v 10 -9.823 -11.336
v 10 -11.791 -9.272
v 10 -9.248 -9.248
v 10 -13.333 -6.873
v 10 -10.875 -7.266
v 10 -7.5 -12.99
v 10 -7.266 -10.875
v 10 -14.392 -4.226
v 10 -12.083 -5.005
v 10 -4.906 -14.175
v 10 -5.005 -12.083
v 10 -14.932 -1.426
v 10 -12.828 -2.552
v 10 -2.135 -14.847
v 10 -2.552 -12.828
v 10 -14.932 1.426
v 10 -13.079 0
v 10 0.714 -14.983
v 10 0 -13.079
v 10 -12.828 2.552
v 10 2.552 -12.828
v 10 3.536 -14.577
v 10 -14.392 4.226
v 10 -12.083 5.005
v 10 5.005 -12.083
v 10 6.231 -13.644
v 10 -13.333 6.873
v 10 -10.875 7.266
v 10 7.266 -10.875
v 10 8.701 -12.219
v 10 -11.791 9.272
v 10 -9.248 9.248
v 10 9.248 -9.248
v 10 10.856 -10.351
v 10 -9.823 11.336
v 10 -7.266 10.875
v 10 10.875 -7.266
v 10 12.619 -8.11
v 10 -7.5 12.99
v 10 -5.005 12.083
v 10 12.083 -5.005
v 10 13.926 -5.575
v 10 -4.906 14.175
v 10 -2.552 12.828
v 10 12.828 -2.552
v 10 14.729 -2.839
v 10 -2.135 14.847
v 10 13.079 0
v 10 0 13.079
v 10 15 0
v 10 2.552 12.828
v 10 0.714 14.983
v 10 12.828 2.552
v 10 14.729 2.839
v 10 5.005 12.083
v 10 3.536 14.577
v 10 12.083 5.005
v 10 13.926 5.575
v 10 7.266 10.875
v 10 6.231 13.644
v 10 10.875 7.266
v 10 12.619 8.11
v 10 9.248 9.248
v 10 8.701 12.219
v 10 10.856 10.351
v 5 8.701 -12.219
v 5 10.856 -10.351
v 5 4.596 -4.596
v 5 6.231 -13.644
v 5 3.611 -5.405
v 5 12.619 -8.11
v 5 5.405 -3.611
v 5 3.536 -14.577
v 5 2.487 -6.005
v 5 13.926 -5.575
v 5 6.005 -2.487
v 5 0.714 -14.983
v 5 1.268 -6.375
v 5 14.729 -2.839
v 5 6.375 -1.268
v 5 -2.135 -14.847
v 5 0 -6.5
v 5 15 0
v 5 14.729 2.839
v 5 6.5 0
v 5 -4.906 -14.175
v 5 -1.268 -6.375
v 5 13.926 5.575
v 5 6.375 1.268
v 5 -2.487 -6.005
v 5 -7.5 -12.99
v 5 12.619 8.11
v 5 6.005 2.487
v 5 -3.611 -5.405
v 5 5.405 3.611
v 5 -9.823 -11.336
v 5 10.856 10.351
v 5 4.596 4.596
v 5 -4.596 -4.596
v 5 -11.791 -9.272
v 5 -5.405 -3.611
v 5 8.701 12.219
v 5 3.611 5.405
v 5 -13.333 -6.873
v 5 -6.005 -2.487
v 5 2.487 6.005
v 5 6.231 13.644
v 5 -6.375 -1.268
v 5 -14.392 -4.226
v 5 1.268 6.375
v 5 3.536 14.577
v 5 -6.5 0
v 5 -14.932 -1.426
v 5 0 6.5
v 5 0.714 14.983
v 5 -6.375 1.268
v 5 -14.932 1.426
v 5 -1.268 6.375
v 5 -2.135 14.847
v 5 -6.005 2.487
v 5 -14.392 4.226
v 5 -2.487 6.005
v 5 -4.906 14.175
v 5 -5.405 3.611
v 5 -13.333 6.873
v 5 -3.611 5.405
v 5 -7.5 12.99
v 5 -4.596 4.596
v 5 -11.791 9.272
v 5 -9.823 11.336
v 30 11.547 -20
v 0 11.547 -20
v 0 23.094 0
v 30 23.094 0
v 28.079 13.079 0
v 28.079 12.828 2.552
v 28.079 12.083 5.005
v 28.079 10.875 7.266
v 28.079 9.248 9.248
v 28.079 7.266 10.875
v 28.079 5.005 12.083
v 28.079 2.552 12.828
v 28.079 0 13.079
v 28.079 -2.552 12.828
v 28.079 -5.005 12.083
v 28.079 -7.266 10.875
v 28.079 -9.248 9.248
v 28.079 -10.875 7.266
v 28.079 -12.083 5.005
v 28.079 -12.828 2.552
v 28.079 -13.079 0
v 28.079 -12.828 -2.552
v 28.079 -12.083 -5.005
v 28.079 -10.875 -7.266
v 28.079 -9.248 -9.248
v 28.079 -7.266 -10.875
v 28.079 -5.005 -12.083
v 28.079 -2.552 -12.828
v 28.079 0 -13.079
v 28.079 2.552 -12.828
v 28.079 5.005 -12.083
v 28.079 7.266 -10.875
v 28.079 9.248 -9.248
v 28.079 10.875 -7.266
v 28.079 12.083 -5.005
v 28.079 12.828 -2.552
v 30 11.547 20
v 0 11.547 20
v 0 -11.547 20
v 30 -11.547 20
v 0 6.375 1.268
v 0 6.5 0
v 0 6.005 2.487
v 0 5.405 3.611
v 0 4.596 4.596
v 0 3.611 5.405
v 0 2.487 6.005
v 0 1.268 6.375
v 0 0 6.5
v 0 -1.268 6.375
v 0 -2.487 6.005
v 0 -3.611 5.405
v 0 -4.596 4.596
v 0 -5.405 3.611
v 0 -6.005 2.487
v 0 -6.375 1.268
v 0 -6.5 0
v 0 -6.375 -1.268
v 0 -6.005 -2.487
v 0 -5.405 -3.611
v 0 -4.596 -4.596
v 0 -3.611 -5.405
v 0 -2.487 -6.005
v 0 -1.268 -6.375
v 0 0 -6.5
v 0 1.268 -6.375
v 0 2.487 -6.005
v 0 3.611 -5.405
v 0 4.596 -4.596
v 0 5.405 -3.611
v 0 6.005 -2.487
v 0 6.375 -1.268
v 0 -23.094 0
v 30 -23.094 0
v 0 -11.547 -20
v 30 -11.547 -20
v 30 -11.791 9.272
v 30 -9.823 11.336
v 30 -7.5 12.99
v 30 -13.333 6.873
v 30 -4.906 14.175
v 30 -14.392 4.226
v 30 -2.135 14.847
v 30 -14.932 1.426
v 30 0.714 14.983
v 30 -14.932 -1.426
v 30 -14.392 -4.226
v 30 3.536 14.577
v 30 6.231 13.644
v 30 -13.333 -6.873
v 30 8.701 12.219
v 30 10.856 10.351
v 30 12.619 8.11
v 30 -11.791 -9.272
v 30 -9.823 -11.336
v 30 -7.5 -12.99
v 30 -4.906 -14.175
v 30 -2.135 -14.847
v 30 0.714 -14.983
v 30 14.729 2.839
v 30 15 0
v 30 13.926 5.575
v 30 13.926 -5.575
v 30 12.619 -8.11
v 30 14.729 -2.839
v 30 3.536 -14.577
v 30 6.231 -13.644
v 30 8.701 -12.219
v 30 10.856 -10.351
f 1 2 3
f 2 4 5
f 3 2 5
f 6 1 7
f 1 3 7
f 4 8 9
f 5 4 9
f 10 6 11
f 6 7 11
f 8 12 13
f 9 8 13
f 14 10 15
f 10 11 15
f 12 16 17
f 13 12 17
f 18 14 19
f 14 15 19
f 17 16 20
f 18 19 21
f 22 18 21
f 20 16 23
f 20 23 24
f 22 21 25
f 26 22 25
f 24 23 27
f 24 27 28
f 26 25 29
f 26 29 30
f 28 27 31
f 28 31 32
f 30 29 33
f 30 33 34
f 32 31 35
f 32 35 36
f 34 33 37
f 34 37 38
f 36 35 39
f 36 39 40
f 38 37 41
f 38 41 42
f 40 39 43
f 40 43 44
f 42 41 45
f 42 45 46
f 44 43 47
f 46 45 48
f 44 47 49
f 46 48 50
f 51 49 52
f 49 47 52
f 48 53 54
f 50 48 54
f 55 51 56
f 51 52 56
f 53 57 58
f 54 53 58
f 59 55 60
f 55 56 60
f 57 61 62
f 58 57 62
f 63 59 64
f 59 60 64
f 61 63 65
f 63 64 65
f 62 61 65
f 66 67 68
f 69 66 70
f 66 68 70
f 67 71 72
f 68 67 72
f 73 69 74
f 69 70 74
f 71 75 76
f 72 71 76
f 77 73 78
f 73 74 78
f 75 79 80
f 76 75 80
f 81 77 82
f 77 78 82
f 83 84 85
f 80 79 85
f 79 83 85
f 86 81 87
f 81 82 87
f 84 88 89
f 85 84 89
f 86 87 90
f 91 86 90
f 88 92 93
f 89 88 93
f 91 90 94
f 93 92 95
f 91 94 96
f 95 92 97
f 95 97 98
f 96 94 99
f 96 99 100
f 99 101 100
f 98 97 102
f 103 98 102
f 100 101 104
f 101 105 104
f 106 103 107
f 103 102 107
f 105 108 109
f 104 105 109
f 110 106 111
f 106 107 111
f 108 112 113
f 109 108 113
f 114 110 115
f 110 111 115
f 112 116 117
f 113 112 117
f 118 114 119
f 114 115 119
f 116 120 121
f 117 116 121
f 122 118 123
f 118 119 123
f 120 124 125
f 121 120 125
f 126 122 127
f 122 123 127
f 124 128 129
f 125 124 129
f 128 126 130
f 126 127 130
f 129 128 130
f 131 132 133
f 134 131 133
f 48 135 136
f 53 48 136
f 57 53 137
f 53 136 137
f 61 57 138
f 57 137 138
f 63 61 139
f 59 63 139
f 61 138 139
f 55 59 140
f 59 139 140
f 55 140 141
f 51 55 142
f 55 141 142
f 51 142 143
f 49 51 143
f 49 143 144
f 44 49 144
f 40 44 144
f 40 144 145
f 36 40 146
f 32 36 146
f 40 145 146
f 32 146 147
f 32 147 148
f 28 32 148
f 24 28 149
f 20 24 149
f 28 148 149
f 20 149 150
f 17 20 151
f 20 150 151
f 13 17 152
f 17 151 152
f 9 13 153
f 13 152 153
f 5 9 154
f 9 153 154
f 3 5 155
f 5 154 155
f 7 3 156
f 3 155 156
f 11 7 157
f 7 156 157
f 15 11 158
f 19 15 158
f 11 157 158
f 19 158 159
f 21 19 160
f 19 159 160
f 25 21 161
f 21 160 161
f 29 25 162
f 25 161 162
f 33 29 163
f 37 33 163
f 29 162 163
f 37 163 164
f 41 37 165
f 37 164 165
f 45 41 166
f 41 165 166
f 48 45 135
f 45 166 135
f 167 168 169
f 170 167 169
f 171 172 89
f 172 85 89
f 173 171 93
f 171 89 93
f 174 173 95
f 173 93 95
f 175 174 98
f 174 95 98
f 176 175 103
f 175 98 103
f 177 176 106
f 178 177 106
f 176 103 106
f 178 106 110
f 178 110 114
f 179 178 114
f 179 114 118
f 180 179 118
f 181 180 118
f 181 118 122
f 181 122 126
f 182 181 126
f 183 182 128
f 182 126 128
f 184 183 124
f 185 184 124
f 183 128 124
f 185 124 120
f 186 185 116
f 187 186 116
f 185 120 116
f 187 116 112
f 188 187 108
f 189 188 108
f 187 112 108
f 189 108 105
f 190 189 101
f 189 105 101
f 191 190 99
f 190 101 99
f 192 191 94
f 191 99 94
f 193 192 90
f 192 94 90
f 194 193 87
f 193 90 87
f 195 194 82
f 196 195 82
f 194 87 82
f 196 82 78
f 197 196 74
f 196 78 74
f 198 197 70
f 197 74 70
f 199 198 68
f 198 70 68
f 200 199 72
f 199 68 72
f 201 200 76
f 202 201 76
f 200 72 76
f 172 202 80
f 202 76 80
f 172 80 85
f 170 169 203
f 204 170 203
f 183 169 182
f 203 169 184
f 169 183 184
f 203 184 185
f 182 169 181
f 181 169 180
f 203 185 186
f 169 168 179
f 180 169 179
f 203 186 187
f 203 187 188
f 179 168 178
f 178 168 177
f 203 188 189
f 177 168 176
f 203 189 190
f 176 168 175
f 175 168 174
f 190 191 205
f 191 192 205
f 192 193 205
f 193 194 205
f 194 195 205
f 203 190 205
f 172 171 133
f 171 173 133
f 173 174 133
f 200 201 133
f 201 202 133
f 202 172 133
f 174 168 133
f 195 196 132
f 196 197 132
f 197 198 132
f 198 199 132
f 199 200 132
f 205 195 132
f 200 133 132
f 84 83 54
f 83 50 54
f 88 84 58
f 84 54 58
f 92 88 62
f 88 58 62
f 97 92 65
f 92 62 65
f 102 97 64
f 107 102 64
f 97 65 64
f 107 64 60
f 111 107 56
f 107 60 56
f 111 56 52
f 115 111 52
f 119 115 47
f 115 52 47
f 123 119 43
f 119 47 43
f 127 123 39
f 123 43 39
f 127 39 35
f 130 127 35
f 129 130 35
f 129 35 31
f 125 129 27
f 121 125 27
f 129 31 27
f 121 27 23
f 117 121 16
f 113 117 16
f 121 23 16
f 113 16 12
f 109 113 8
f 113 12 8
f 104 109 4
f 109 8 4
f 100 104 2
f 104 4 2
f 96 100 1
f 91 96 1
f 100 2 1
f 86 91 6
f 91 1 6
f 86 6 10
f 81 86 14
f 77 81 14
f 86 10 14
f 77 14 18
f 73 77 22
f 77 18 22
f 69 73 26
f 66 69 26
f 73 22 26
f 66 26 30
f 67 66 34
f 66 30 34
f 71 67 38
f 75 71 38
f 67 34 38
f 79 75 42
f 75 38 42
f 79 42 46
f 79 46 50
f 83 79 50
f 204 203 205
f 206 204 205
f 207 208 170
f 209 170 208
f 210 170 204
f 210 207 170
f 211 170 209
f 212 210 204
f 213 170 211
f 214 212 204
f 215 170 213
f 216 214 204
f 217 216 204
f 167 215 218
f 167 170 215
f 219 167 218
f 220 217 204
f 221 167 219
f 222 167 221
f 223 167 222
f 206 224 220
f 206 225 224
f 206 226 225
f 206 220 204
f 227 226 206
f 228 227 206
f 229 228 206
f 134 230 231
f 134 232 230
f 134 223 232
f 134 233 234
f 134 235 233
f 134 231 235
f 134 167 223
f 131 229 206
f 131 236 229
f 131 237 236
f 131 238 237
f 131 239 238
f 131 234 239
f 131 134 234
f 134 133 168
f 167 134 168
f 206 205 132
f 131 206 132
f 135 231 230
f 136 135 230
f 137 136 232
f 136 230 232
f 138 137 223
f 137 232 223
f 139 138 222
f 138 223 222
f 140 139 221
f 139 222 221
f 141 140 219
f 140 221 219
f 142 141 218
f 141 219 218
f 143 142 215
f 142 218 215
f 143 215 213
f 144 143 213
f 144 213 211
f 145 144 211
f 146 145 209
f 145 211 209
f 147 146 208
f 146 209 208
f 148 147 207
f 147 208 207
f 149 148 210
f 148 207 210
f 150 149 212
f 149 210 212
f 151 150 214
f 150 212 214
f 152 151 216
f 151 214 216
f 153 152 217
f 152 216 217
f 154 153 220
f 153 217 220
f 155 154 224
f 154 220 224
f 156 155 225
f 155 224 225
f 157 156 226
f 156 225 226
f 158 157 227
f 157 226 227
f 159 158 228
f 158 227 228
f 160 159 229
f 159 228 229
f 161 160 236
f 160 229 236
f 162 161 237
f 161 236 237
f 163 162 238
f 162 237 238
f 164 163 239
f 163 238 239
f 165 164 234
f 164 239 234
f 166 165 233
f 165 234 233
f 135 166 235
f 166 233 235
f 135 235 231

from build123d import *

# Parameters (mm, degrees)
CHAMFER_1_SIZE  = 1.921
SKETCH_2_R      = 19.5
EXTRUDE_1_DEPTH = 30


with BuildPart() as part:
    # Эскиз1 → Повернуть1 (revolve)
    with BuildSketch(Plane.XY):
        Polygon((0, 6.5), (5, 6.5), (5, 15), (10, 15), (10, 13.079), (30, 13.079), (30, 19.5), (0, 19.5), align=None)
    revolve(axis=Axis((0, 0, 0), (1, 0, 0)))

    # Фаска1
    chamfer_1_edges = [part.edges().sort_by_distance(p)[0] for p in [
        (30, -13.079, 0),
    ]]
    chamfer(chamfer_1_edges, length=CHAMFER_1_SIZE)

    # Эскиз2 → Бобышка-Вытянуть1 (add)
    with BuildSketch(Plane(origin=(30, 0, 0), x_dir=(0, 0, -1), z_dir=(1, 0, 0))):
        Polygon((0, 23.094010768), (-20, 11.547005384), (-20, -11.547005384), (0, -23.094010768), (20, -11.547005384), (20, 11.547005384), align=None)
        Circle(SKETCH_2_R, mode=Mode.SUBTRACT)
    extrude(amount=-EXTRUDE_1_DEPTH)


solid = part.part
